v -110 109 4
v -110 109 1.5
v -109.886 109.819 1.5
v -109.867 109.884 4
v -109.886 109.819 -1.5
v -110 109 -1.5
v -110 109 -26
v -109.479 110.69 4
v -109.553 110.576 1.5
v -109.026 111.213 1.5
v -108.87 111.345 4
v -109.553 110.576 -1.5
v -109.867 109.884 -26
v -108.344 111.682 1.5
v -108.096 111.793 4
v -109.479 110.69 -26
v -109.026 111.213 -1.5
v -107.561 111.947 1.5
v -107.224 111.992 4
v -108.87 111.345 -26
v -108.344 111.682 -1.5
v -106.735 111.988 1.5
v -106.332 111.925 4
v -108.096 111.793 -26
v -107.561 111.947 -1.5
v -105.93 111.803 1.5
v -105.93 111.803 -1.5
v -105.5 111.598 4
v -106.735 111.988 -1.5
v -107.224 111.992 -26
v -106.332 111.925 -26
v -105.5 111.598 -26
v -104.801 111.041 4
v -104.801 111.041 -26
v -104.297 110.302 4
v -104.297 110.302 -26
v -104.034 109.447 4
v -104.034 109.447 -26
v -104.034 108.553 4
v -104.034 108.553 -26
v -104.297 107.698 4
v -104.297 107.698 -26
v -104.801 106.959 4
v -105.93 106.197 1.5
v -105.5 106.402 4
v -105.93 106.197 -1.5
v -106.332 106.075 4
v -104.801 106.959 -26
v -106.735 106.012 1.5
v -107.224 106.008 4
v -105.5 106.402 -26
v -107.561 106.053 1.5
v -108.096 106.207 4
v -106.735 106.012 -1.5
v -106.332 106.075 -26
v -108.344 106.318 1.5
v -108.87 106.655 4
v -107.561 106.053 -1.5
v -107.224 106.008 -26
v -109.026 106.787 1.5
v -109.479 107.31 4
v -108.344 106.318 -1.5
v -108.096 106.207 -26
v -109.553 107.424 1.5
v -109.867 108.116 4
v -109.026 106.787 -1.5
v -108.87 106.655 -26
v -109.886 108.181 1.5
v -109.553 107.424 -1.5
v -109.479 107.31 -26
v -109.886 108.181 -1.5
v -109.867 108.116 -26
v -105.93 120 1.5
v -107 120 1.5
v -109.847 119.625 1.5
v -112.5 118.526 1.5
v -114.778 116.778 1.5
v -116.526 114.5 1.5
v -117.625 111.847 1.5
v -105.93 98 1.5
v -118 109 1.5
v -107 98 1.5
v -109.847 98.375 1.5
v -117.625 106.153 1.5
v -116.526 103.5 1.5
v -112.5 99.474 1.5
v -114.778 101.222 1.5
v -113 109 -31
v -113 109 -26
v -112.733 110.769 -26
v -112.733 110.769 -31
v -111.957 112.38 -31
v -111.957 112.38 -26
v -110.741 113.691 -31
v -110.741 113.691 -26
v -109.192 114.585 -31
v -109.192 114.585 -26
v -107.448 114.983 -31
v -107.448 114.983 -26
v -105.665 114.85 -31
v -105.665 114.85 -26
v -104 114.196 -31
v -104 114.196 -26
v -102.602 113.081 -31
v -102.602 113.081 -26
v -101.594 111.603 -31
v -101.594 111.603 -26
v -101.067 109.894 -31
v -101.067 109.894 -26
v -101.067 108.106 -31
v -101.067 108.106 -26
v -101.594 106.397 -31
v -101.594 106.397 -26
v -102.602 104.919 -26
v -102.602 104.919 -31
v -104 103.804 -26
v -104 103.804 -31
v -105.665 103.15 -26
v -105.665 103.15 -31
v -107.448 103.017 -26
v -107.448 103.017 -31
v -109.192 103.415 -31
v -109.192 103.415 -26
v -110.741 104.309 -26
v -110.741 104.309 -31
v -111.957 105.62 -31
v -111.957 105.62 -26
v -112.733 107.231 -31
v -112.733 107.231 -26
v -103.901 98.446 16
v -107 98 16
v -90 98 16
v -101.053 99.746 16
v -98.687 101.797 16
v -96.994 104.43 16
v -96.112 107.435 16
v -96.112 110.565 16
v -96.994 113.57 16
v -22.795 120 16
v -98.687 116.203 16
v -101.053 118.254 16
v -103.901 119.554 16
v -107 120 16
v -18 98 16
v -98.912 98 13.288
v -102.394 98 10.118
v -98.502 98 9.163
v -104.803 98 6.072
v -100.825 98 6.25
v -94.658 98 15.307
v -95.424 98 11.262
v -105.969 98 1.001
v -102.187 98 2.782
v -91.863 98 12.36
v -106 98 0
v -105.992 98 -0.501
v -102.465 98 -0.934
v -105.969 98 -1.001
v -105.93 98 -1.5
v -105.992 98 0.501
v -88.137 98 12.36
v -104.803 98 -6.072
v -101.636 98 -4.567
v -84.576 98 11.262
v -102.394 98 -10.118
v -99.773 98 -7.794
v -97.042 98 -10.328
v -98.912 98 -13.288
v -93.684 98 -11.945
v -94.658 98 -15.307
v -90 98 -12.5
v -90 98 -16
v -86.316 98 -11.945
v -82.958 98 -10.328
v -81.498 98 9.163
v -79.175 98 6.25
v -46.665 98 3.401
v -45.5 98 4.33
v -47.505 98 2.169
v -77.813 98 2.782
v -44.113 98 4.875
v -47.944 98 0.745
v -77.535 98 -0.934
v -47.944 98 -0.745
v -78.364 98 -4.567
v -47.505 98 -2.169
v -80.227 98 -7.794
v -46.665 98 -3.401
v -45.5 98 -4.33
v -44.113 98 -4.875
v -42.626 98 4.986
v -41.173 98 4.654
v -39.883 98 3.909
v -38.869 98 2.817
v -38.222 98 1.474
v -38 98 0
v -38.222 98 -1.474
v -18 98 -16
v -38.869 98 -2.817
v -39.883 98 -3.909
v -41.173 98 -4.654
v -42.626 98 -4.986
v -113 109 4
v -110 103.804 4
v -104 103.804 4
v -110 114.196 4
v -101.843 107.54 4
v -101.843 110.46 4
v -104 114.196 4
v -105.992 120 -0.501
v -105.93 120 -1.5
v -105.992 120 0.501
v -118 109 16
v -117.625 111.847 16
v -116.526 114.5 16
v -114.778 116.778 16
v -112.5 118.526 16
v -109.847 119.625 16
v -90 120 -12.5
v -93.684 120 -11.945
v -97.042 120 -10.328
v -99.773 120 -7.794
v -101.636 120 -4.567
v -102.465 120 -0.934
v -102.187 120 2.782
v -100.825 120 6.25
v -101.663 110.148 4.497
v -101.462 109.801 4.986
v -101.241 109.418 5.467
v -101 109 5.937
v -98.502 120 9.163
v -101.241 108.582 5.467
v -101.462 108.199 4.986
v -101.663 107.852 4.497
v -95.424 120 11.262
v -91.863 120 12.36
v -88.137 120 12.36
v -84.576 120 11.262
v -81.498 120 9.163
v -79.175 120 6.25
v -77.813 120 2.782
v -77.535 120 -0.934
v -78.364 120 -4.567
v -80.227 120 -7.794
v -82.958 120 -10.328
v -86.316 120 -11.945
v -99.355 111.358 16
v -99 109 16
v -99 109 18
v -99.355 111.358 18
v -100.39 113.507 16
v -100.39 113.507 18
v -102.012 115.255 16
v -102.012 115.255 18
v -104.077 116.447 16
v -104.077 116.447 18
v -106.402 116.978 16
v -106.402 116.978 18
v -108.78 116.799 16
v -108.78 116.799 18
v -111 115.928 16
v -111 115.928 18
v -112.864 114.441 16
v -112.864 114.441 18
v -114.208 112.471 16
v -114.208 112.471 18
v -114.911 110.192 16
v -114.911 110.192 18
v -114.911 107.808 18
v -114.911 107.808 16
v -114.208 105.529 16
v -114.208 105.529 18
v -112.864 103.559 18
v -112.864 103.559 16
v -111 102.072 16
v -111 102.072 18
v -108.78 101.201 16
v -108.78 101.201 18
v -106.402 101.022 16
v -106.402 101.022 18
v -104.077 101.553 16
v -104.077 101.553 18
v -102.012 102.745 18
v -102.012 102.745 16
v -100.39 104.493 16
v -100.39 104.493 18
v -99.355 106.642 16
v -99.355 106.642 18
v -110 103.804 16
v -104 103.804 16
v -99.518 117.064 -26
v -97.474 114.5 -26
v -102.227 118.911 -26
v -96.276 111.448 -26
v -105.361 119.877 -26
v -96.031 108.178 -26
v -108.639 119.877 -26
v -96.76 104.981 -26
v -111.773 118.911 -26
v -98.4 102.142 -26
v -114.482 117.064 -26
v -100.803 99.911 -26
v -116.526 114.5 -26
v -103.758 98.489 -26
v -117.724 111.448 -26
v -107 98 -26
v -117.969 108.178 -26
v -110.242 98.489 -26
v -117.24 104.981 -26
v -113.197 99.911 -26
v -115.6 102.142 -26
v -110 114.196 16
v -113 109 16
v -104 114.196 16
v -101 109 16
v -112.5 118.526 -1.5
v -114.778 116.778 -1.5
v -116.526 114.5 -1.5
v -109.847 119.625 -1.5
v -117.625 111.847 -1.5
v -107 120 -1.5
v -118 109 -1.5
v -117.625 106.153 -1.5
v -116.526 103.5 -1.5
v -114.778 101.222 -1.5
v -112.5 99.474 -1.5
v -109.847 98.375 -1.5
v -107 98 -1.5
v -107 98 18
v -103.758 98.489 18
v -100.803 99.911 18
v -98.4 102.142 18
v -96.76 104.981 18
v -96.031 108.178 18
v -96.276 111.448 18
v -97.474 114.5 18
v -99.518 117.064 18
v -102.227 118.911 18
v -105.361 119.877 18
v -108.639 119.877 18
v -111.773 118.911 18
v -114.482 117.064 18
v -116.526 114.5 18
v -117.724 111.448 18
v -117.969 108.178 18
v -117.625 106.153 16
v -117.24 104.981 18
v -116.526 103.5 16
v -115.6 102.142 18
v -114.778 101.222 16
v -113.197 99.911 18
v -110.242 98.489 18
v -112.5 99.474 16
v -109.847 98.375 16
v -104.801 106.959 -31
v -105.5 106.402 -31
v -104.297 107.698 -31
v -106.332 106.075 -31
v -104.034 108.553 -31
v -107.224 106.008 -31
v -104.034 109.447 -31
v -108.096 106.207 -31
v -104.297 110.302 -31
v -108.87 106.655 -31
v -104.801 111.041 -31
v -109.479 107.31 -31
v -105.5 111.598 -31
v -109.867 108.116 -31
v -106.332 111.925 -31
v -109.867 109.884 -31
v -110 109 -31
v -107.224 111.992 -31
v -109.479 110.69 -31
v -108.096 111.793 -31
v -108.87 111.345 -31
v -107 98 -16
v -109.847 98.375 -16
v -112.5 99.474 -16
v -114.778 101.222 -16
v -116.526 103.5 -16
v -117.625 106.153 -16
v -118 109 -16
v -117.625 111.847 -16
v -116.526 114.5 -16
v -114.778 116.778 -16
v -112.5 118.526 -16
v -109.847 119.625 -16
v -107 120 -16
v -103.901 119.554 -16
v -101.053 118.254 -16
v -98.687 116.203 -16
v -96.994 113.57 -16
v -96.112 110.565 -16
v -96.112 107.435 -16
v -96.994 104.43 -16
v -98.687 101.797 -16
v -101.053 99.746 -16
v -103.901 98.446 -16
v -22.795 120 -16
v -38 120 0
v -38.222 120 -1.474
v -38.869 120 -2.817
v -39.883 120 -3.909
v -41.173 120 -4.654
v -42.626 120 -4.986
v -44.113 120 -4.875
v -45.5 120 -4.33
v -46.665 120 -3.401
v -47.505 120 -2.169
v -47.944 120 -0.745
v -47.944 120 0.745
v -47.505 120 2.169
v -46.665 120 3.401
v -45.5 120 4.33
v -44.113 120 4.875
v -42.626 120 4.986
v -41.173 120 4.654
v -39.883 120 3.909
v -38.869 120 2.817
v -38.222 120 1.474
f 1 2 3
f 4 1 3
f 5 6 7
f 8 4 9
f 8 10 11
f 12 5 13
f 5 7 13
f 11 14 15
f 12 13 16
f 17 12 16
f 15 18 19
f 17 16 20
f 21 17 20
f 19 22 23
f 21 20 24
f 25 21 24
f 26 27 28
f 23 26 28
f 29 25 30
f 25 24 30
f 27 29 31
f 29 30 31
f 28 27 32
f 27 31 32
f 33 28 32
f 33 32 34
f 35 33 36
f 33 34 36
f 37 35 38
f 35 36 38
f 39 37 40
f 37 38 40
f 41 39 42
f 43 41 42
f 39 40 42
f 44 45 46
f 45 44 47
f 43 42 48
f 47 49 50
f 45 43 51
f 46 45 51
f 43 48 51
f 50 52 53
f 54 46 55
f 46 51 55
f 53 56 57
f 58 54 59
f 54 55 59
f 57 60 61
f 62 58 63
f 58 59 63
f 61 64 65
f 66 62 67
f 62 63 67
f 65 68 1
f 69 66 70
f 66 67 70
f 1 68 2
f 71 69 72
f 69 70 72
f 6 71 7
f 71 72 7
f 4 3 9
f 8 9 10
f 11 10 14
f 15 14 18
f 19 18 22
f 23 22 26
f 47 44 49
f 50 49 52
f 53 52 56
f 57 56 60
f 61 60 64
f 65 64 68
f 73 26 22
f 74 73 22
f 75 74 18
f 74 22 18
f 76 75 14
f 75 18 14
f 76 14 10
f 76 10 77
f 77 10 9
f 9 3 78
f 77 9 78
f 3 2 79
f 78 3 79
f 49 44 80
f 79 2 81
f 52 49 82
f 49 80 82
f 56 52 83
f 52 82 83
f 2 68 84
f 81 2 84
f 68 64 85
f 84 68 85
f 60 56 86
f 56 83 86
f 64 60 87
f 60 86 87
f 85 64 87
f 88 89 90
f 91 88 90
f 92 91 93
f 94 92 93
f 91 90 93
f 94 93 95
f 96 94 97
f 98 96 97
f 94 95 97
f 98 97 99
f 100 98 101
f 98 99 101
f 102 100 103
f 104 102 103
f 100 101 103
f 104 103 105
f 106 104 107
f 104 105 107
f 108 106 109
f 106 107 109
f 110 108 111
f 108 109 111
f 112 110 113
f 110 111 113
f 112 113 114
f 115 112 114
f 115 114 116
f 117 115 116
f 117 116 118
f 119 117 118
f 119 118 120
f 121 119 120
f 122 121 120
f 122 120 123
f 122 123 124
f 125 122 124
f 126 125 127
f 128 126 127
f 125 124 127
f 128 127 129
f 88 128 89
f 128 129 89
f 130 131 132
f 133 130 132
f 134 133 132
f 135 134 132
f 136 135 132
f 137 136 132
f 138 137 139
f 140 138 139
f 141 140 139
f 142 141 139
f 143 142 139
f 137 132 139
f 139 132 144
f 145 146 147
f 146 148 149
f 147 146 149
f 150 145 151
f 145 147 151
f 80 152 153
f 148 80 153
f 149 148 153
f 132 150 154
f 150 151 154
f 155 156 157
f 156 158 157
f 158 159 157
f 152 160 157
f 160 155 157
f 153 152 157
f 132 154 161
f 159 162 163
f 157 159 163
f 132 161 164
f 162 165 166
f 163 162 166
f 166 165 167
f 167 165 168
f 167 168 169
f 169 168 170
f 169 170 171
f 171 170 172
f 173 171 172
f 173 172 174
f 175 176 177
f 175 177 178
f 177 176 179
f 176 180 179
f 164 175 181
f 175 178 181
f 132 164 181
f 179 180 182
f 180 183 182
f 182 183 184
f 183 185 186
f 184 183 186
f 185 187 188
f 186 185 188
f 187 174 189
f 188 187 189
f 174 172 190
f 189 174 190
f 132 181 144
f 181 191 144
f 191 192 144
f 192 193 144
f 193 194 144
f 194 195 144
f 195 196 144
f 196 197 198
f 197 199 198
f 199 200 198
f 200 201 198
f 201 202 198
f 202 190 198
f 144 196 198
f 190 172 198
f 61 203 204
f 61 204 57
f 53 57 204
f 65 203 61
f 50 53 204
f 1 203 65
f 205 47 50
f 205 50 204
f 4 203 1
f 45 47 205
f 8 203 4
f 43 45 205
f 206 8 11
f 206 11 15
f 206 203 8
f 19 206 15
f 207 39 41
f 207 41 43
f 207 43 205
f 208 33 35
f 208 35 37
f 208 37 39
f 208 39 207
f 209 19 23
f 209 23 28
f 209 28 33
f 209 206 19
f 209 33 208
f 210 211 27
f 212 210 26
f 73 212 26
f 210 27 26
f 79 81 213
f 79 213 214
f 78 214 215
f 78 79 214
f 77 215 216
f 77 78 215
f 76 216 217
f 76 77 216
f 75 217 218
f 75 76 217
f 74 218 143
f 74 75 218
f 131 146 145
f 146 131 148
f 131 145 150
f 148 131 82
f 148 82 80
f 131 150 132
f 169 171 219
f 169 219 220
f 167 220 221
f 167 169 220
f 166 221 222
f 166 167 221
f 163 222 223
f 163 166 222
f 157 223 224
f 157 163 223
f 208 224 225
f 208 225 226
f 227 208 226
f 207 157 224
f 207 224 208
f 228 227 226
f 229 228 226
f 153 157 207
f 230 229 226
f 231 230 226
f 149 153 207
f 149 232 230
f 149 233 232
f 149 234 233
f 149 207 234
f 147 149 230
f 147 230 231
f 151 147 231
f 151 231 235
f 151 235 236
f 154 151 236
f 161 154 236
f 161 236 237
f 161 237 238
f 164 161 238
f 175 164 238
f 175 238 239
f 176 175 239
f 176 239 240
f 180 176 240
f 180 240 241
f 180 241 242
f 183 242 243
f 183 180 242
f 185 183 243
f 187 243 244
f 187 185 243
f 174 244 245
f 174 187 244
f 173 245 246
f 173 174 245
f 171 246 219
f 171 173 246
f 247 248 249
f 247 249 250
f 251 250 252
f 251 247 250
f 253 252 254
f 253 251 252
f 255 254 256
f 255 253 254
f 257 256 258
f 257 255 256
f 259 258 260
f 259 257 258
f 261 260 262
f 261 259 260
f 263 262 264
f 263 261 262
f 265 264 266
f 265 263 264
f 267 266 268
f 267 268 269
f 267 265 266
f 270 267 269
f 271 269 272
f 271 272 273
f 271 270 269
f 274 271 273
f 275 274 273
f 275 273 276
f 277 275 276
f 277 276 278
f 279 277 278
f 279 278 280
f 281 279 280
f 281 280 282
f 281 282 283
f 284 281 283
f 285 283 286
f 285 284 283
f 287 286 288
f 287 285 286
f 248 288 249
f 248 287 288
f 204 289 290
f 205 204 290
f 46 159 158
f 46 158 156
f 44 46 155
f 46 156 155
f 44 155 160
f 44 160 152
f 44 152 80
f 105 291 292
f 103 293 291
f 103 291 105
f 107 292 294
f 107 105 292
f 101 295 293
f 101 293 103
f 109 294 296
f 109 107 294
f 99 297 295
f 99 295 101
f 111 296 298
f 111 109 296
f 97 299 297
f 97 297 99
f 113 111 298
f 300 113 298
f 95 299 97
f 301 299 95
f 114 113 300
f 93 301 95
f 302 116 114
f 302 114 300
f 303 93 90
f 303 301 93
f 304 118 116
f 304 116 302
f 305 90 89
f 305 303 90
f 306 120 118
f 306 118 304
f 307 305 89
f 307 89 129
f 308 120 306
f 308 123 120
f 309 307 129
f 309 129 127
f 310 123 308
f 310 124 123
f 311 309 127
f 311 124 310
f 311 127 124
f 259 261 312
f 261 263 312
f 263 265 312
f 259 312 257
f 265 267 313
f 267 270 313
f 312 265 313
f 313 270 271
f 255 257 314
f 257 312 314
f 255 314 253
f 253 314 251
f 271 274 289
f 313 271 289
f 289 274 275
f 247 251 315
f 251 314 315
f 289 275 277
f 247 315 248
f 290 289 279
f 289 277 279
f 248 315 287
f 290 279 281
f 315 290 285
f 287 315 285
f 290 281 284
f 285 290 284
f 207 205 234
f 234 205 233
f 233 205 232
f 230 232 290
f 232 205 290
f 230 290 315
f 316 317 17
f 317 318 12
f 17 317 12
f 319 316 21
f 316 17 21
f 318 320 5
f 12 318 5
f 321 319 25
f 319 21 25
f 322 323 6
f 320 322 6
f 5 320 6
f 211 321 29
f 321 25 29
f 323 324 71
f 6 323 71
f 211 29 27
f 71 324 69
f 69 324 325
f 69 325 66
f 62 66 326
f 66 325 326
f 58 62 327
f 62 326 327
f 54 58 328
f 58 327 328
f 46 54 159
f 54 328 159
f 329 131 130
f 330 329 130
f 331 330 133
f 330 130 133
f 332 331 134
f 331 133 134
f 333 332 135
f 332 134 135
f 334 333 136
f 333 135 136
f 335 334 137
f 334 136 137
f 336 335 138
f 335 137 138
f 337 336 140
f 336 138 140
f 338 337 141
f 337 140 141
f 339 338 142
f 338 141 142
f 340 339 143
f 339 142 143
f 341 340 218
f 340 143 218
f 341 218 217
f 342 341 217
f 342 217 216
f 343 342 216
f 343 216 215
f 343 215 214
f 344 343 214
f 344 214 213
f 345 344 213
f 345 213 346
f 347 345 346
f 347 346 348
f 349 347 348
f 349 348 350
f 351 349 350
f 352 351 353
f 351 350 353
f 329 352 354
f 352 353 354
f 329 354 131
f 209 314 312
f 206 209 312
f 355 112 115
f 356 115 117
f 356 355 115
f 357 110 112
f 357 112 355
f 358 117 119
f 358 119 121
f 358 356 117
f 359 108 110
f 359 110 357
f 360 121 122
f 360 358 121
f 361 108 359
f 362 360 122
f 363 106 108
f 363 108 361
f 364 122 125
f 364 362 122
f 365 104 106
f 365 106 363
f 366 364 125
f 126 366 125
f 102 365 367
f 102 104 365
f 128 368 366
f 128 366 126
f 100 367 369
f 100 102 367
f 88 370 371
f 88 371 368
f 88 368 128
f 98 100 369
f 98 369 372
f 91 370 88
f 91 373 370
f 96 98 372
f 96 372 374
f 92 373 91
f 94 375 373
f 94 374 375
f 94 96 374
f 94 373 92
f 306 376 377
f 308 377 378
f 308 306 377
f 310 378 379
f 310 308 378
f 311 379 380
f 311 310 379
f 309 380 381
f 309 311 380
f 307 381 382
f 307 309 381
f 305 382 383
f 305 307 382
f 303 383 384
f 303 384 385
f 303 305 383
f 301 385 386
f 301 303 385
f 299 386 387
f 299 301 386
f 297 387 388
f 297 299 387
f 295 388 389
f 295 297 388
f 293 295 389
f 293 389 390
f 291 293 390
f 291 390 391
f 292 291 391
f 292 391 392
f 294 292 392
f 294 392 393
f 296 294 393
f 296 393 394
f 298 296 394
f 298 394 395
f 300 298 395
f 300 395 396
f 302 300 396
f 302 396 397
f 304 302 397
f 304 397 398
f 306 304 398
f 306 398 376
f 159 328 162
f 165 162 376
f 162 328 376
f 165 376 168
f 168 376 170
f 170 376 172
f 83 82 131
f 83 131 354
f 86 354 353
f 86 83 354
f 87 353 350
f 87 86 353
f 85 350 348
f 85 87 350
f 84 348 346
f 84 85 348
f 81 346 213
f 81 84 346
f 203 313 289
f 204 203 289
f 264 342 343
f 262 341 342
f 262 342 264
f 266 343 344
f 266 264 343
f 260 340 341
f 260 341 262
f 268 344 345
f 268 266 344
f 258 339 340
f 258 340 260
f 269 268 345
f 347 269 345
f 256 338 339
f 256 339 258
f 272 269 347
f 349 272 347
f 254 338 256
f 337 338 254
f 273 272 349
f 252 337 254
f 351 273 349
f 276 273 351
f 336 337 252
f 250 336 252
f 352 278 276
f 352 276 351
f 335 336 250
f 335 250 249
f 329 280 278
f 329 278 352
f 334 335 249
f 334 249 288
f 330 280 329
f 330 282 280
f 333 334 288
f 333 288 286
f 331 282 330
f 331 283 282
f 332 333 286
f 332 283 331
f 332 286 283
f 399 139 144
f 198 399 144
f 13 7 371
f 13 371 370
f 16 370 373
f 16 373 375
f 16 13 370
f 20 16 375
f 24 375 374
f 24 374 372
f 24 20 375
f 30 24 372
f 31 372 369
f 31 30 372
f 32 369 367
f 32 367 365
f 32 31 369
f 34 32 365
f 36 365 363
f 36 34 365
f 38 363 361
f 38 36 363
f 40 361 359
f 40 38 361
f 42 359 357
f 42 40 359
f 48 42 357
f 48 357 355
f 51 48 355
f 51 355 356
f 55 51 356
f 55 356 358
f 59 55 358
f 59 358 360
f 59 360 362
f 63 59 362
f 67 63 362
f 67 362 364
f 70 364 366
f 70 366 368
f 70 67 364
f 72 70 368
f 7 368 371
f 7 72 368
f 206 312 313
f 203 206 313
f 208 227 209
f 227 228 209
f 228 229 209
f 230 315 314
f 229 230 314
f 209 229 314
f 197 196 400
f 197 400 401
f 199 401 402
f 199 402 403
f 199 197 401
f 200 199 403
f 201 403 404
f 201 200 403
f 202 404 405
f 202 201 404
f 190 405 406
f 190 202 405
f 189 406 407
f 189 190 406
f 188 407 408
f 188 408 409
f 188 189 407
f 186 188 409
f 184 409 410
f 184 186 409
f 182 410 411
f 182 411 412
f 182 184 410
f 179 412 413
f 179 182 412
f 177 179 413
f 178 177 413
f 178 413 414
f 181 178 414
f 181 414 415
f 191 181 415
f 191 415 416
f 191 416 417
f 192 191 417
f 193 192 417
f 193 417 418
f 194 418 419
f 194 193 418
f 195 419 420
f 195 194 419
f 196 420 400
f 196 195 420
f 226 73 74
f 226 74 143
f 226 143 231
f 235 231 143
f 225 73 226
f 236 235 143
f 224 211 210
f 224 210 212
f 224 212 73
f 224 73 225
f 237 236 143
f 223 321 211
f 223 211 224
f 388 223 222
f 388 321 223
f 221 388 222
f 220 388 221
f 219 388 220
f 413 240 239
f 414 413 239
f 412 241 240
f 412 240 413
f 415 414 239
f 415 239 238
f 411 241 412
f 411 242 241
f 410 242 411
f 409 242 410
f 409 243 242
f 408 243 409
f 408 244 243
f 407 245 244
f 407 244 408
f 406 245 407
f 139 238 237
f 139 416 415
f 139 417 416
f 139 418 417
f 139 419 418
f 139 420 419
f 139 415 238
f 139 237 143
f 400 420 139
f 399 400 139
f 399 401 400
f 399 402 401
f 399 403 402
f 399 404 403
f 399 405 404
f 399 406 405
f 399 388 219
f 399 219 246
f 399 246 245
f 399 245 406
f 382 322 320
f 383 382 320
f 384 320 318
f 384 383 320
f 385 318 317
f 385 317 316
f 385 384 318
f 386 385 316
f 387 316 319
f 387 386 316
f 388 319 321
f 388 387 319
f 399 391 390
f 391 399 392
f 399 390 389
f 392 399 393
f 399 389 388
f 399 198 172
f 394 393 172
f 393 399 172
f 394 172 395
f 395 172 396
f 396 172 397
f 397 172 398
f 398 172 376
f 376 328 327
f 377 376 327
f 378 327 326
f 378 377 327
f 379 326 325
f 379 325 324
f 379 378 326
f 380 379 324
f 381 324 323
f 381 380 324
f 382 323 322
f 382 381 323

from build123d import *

# Parameters (mm, degrees)
BOSS_EXTRUDE1_DEPTH            = 20
SKETCH2_R                      = 12.5
CUT_EXTRUDE1_DEPTH             = 20
CUT_EXTRUDE3_DEPTH             = 16
BOSS_EXTRUDE9_DEPTH            = 32
CUT_EXTRUDE5_OUTLINE_R         = 12.5
CUT_EXTRUDE5_DEPTH             = 20
SKETCH10_R                     = 7.5
BOSS_EXTRUDE10_DEPTH           = 6
SKETCH11_R                     = 6.5
BOSS_EXTRUDE11_DEPTH           = 5
FILLET5_R                      = 1
FILLET6_R                      = 1
CUT_EXTRUDE7_DEPTH             = 147.965990964
CUT_EXTRUDE7_DEPTH_BACK        = 147.965990964
CUT_EXTRUDE8_REACH             = 148.864
SKETCH21_R                     = 5
CUT_EXTRUDE8_DIRECTION_2_DEPTH = 147.863882558
SKETCH23_R                     = 12.5
SKETCH23_R_2                   = 5
BOSS_EXTRUDE12_DEPTH           = 22
CUT_EXTRUDE13_DEPTH            = 174.703770828
CUT_EXTRUDE13_DEPTH_BACK       = 45
SKETCH24_R                     = 3
SKETCH25_R                     = 11
SKETCH25_R_2                   = 8
BOSS_EXTRUDE13_DEPTH           = 2
BOSS_EXTRUDE14_START           = 10
SKETCH26_R                     = 11
SKETCH26_R_2                   = 3
BOSS_EXTRUDE14_DEPTH           = 10
SKETCH27_R                     = 6
SKETCH27_R_2                   = 3
BOSS_EXTRUDE15_DEPTH           = 5
CUT_EXTRUDE15_DEPTH            = 12


# Read off the part's stored shape, not the designer's step: Cut-Extrude5
with BuildPart() as part:
    # Sketch1 → Boss-Extrude1 (new body)
    with BuildSketch(Plane(origin=(0, 0, 0), x_dir=(1, 0, 0), z_dir=(0, 1, 0))):
        with BuildLine():
            Line((-90, 16), (13.288085522, 16))
            ThreePointArc((13.288085522, 16), (37.171658785, 22.533063908), (53.648380073, 4.05))
            Line((53.648380073, 4.05), (68.648380073, 4.05))
            Line((68.648380073, 4.05), (68.648380073, 0.05))
            Line((68.648380073, 0.05), (53.999946808, 0.05))
            ThreePointArc((53.999946808, 0.05), (54, 0), (53.999946808, -0.05))
            Line((53.999946808, -0.05), (68.648380073, -0.05))
            Line((68.648380073, -0.05), (68.648380073, -4.05))
            Line((68.648380073, -4.05), (53.648380073, -4.05))
            ThreePointArc((53.648380073, -4.05), (37.171658785, -22.533063908), (13.288085522, -16))
            Line((13.288085522, -16), (-90, -16))
            ThreePointArc((-90, -16), (-106, 0), (-90, 16))
        make_face()
    extrude(amount=BOSS_EXTRUDE1_DEPTH)

    # Sketch2 → Cut-Extrude1 (cut)
    with BuildSketch(Plane.XZ):
        with Locations(Location((-90, 0, 0), (0, 0, 270))):
            Circle(SKETCH2_R)
        with BuildLine():
            Line((53.999946808, -0.05), (51.99994186, -0.05))
            ThreePointArc((51.99994186, -0.05), (9, 0), (51.99994186, 0.05))
            Line((51.99994186, 0.05), (53.999946808, 0.05))
            ThreePointArc((53.999946808, 0.05), (54, 0), (53.999946808, -0.05))
        make_face()
    extrude(amount=-CUT_EXTRUDE1_DEPTH, mode=Mode.SUBTRACT)

    # Sketch3 → Cut-Extrude3 (cut)
    with BuildSketch(Plane.XZ):
        with BuildLine():
            Line((-79.416994756, -12), (10.294802649, -12))
            ThreePointArc((10.294802649, -12), (7, 0), (10.294802649, 12))
            Line((10.294802649, 12), (-79.416994756, 12))
            ThreePointArc((-79.416994756, 12), (-75.416994756, 6.583005244), (-74, 0))
            ThreePointArc((-74, 0), (-75.416994756, -6.583005244), (-79.416994756, -12))
        make_face()
    extrude(amount=-CUT_EXTRUDE3_DEPTH, mode=Mode.SUBTRACT)

    # Sketch7 → Boss-Extrude9 (add)
    with BuildSketch(Plane.XY.offset(16)):
        Polygon((-106, 78), (-35.641025641, 78), (-23, 20), (-1, 20), (-18, 98), (-106, 98), align=None)
    extrude(amount=-BOSS_EXTRUDE9_DEPTH)

    # Cut-Extrude5 outline → Cut-Extrude5 (cut)
    with BuildSketch(Plane(origin=(0, 78, 0), x_dir=(1, 0, 0), z_dir=(0, 1, 0))):
        with BuildLine():
            Line((-106, -16), (-90, -16))
            ThreePointArc((-90, -16), (-101.313708581, -11.313708417), (-106, 2.31e-07))
            Line((-106, 2.31e-07), (-106, -16))
        make_face()
        with BuildLine():
            Line((-106, 16), (-106, 2.31e-07))
            ThreePointArc((-106, 2.31e-07), (-101.313708417, 11.313708581), (-90, 16))
            Line((-90, 16), (-106, 16))
        make_face()
        with Locations((-90, 0)):
            Circle(CUT_EXTRUDE5_OUTLINE_R)
    extrude(amount=CUT_EXTRUDE5_DEPTH, mode=Mode.SUBTRACT)

    # Sketch10 → Boss-Extrude10 (add)
    with BuildSketch(Plane(origin=(0, 0, -16), x_dir=(-1, 0, 0), z_dir=(0, 0, -1))):
        with Locations(Location((24, 65, 0), (0, 0, 180))):
            Circle(SKETCH10_R)
    extrude(amount=BOSS_EXTRUDE10_DEPTH)

    # Sketch11 → Boss-Extrude11 (add)
    with BuildSketch(Plane(origin=(0, 0, -22), x_dir=(-1, 0, 0), z_dir=(0, 0, -1))):
        with Locations((24, 65)):
            Circle(SKETCH11_R)
    extrude(amount=BOSS_EXTRUDE11_DEPTH)

    # Fillet5
    fillet5_edges = [part.edges().sort_by_distance(p)[0] for p in [
        (-31.5, 65, -16),
        (-17.5, 65, -27),
        (10.294802649, 8, 12),
        (7, 0, 0),
        (10.294802649, 8, -12),
        (-34.561096053, 0, -12),
        (-79.416994756, 8, -12),
        (-74, 0, 0),
        (-79.416994756, 8, 12),
        (-34.561096053, 0, 12),
        (-34.561096053, 16, 12),
        (7, 16, 0),
        (-74, 16, 0),
    ]]
    fillet(fillet5_edges, radius=FILLET5_R)

    # Fillet6
    fillet6_edges = [part.edges().sort_by_distance(p)[0] for p in [
        (-31.5, 65, -22),
    ]]
    fillet(fillet6_edges, radius=FILLET6_R - 0.0001)  # a hair under: the kernel refuses the full size

    # Sketch20 → Cut-Extrude7 (cut, two sides: drawn at the far end of the back side and taken through both)
    with BuildSketch(Plane(origin=(0, 0, -4.05), x_dir=(-1, 0, 0), z_dir=(0, 0, -1)).offset(-CUT_EXTRUDE7_DEPTH_BACK)):
        with BuildLine():
            Line((-68.648380073, 20), (-68.648380073, 10))
            ThreePointArc((-68.648380073, 10), (-65.719447885, 17.071067812), (-58.648380073, 20))
            Line((-58.648380073, 20), (-68.648380073, 20))
        make_face()
        with BuildLine():
            Line((-68.648380073, 0), (-58.648380073, 0))
            ThreePointArc((-58.648380073, 0), (-65.719447885, 2.928932188), (-68.648380073, 10))
            Line((-68.648380073, 10), (-68.648380073, 0))
        make_face()
        with BuildLine():
            ThreePointArc((-65.648380073, 10), (-59.648380073, 4), (-53.648380073, 10))
            Line((-53.648380073, 10), (-65.648380073, 10))
        make_face()
        with BuildLine():
            Line((-65.648380073, 10), (-53.648380073, 10))
            ThreePointArc((-53.648380073, 10), (-59.648380073, 16), (-65.648380073, 10))
        make_face()
    extrude(amount=CUT_EXTRUDE7_DEPTH + CUT_EXTRUDE7_DEPTH_BACK, mode=Mode.SUBTRACT)

    # Sketch21 → Cut-Extrude8 (cut, up to next)
    with BuildSketch(Plane(origin=(0, 98, 0), x_dir=(1, 0, 0), z_dir=(0, 1, 0)), mode=Mode.PRIVATE) as cut_extrude8_sk1:
        with Locations((-43, 0)):
            Circle(SKETCH21_R)
    cut_extrude8_tool1 = extrude(cut_extrude8_sk1.sketch, amount=-CUT_EXTRUDE8_REACH, mode=Mode.PRIVATE) & part.part
    add(cut_extrude8_tool1.solids().sort_by_distance((-43, 98, 0))[0], mode=Mode.SUBTRACT)

    # Sketch21 → Cut-Extrude8 direction 2 (cut)
    with BuildSketch(Plane(origin=(0, 98, 0), x_dir=(1, 0, 0), z_dir=(0, 1, 0))):
        with Locations((-43, 0)):
            Circle(SKETCH21_R)
    extrude(amount=CUT_EXTRUDE8_DIRECTION_2_DEPTH, mode=Mode.SUBTRACT)



with BuildPart() as body_2:
    # Sketch23 → Boss-Extrude12 (new body)
    with BuildSketch(Plane(origin=(0, 98, 0), x_dir=(1, 0, 0), z_dir=(0, 1, 0))):
        with BuildLine():
            Line((-118, -1.5), (-118, -16))
            Line((-118, -16), (-90, -16))
            Line((-90, -16), (-18, -16))
            Line((-18, -16), (-18, 16))
            Line((-18, 16), (-90, 16))
            Line((-90, 16), (-118, 16))
            Line((-118, 16), (-118, 1.5))
            Line((-118, 1.5), (-105.929532322, 1.5))
            ThreePointArc((-105.929532322, 1.5), (-106, 0), (-105.929532322, -1.5))
            Line((-105.929532322, -1.5), (-118, -1.5))
        make_face()
        with Locations(Location((-90, 0, 0), (0, 0, 90))):
            Circle(SKETCH23_R, mode=Mode.SUBTRACT)
        with Locations((-43, 0)):
            Circle(SKETCH23_R_2, mode=Mode.SUBTRACT)
    extrude(amount=BOSS_EXTRUDE12_DEPTH)

    # Sketch24 → Cut-Extrude13 (cut, two sides: drawn at the far end of the back side and taken through both)
    with BuildSketch(Plane.XY.offset(16).offset(-CUT_EXTRUDE13_DEPTH_BACK)):
        with BuildLine():
            ThreePointArc((-118, 109), (-114.778174593, 116.778174593), (-107, 120))
            Line((-107, 120), (-118, 120))
            Line((-118, 120), (-118, 109))
        make_face()
        with BuildLine():
            Line((-118, 98), (-107, 98))
            ThreePointArc((-107, 98), (-114.778174593, 101.221825407), (-118, 109))
            Line((-118, 109), (-118, 98))
        make_face()
        Polygon((-22.794871795, 120), (-18, 98), (-18, 120), align=None)
        with Locations(Location((-107, 109, 0), (0, 0, 180))):
            Circle(SKETCH24_R)
    extrude(amount=CUT_EXTRUDE13_DEPTH + CUT_EXTRUDE13_DEPTH_BACK, mode=Mode.SUBTRACT)


with BuildPart() as part_1:
    add(part.part)

    add(body_2.part)  # Boss-Extrude13 merges body 2
    # Sketch25 → Boss-Extrude13 (add)
    with BuildSketch(Plane.XY.offset(16)):
        with Locations(Location((-107, 109, 0), (0, 0, 270))):
            Circle(SKETCH25_R)
        with Locations((-107, 109)):
            Circle(SKETCH25_R_2, mode=Mode.SUBTRACT)
    extrude(amount=BOSS_EXTRUDE13_DEPTH)

    # Sketch26 → Boss-Extrude14 (add)
    with BuildSketch(Plane(origin=(0, 0, -16), x_dir=(-1, 0, 0), z_dir=(0, 0, -1)).offset(BOSS_EXTRUDE14_START)):
        with Locations(Location((107, 109, 0), (0, 0, 270))):
            Circle(SKETCH26_R)
        with Locations((107, 109)):
            Circle(SKETCH26_R_2, mode=Mode.SUBTRACT)
    extrude(amount=-BOSS_EXTRUDE14_DEPTH)

    # Sketch27 → Boss-Extrude15 (add)
    with BuildSketch(Plane(origin=(0, 0, -26), x_dir=(-1, 0, 0), z_dir=(0, 0, -1))):
        with Locations((107, 109)):
            Circle(SKETCH27_R)
        with Locations((107, 109)):
            Circle(SKETCH27_R_2, mode=Mode.SUBTRACT)
    extrude(amount=BOSS_EXTRUDE15_DEPTH)

    # Sketch29 → Cut-Extrude15 (cut)
    with BuildSketch(Plane.XY.offset(16)):
        Polygon((-104, 114.196152423), (-110, 114.196152423), (-113, 109), (-110, 103.803847577), (-104, 103.803847577), (-101, 109), align=None)
    extrude(amount=-CUT_EXTRUDE15_DEPTH, mode=Mode.SUBTRACT)

    # SurfaceCut1
    split(bisect_by=Plane(origin=(0, 98, 0), x_dir=(1, 0, 0), z_dir=(0, 1, 0)), keep=Keep.TOP)


solid = part_1.part
